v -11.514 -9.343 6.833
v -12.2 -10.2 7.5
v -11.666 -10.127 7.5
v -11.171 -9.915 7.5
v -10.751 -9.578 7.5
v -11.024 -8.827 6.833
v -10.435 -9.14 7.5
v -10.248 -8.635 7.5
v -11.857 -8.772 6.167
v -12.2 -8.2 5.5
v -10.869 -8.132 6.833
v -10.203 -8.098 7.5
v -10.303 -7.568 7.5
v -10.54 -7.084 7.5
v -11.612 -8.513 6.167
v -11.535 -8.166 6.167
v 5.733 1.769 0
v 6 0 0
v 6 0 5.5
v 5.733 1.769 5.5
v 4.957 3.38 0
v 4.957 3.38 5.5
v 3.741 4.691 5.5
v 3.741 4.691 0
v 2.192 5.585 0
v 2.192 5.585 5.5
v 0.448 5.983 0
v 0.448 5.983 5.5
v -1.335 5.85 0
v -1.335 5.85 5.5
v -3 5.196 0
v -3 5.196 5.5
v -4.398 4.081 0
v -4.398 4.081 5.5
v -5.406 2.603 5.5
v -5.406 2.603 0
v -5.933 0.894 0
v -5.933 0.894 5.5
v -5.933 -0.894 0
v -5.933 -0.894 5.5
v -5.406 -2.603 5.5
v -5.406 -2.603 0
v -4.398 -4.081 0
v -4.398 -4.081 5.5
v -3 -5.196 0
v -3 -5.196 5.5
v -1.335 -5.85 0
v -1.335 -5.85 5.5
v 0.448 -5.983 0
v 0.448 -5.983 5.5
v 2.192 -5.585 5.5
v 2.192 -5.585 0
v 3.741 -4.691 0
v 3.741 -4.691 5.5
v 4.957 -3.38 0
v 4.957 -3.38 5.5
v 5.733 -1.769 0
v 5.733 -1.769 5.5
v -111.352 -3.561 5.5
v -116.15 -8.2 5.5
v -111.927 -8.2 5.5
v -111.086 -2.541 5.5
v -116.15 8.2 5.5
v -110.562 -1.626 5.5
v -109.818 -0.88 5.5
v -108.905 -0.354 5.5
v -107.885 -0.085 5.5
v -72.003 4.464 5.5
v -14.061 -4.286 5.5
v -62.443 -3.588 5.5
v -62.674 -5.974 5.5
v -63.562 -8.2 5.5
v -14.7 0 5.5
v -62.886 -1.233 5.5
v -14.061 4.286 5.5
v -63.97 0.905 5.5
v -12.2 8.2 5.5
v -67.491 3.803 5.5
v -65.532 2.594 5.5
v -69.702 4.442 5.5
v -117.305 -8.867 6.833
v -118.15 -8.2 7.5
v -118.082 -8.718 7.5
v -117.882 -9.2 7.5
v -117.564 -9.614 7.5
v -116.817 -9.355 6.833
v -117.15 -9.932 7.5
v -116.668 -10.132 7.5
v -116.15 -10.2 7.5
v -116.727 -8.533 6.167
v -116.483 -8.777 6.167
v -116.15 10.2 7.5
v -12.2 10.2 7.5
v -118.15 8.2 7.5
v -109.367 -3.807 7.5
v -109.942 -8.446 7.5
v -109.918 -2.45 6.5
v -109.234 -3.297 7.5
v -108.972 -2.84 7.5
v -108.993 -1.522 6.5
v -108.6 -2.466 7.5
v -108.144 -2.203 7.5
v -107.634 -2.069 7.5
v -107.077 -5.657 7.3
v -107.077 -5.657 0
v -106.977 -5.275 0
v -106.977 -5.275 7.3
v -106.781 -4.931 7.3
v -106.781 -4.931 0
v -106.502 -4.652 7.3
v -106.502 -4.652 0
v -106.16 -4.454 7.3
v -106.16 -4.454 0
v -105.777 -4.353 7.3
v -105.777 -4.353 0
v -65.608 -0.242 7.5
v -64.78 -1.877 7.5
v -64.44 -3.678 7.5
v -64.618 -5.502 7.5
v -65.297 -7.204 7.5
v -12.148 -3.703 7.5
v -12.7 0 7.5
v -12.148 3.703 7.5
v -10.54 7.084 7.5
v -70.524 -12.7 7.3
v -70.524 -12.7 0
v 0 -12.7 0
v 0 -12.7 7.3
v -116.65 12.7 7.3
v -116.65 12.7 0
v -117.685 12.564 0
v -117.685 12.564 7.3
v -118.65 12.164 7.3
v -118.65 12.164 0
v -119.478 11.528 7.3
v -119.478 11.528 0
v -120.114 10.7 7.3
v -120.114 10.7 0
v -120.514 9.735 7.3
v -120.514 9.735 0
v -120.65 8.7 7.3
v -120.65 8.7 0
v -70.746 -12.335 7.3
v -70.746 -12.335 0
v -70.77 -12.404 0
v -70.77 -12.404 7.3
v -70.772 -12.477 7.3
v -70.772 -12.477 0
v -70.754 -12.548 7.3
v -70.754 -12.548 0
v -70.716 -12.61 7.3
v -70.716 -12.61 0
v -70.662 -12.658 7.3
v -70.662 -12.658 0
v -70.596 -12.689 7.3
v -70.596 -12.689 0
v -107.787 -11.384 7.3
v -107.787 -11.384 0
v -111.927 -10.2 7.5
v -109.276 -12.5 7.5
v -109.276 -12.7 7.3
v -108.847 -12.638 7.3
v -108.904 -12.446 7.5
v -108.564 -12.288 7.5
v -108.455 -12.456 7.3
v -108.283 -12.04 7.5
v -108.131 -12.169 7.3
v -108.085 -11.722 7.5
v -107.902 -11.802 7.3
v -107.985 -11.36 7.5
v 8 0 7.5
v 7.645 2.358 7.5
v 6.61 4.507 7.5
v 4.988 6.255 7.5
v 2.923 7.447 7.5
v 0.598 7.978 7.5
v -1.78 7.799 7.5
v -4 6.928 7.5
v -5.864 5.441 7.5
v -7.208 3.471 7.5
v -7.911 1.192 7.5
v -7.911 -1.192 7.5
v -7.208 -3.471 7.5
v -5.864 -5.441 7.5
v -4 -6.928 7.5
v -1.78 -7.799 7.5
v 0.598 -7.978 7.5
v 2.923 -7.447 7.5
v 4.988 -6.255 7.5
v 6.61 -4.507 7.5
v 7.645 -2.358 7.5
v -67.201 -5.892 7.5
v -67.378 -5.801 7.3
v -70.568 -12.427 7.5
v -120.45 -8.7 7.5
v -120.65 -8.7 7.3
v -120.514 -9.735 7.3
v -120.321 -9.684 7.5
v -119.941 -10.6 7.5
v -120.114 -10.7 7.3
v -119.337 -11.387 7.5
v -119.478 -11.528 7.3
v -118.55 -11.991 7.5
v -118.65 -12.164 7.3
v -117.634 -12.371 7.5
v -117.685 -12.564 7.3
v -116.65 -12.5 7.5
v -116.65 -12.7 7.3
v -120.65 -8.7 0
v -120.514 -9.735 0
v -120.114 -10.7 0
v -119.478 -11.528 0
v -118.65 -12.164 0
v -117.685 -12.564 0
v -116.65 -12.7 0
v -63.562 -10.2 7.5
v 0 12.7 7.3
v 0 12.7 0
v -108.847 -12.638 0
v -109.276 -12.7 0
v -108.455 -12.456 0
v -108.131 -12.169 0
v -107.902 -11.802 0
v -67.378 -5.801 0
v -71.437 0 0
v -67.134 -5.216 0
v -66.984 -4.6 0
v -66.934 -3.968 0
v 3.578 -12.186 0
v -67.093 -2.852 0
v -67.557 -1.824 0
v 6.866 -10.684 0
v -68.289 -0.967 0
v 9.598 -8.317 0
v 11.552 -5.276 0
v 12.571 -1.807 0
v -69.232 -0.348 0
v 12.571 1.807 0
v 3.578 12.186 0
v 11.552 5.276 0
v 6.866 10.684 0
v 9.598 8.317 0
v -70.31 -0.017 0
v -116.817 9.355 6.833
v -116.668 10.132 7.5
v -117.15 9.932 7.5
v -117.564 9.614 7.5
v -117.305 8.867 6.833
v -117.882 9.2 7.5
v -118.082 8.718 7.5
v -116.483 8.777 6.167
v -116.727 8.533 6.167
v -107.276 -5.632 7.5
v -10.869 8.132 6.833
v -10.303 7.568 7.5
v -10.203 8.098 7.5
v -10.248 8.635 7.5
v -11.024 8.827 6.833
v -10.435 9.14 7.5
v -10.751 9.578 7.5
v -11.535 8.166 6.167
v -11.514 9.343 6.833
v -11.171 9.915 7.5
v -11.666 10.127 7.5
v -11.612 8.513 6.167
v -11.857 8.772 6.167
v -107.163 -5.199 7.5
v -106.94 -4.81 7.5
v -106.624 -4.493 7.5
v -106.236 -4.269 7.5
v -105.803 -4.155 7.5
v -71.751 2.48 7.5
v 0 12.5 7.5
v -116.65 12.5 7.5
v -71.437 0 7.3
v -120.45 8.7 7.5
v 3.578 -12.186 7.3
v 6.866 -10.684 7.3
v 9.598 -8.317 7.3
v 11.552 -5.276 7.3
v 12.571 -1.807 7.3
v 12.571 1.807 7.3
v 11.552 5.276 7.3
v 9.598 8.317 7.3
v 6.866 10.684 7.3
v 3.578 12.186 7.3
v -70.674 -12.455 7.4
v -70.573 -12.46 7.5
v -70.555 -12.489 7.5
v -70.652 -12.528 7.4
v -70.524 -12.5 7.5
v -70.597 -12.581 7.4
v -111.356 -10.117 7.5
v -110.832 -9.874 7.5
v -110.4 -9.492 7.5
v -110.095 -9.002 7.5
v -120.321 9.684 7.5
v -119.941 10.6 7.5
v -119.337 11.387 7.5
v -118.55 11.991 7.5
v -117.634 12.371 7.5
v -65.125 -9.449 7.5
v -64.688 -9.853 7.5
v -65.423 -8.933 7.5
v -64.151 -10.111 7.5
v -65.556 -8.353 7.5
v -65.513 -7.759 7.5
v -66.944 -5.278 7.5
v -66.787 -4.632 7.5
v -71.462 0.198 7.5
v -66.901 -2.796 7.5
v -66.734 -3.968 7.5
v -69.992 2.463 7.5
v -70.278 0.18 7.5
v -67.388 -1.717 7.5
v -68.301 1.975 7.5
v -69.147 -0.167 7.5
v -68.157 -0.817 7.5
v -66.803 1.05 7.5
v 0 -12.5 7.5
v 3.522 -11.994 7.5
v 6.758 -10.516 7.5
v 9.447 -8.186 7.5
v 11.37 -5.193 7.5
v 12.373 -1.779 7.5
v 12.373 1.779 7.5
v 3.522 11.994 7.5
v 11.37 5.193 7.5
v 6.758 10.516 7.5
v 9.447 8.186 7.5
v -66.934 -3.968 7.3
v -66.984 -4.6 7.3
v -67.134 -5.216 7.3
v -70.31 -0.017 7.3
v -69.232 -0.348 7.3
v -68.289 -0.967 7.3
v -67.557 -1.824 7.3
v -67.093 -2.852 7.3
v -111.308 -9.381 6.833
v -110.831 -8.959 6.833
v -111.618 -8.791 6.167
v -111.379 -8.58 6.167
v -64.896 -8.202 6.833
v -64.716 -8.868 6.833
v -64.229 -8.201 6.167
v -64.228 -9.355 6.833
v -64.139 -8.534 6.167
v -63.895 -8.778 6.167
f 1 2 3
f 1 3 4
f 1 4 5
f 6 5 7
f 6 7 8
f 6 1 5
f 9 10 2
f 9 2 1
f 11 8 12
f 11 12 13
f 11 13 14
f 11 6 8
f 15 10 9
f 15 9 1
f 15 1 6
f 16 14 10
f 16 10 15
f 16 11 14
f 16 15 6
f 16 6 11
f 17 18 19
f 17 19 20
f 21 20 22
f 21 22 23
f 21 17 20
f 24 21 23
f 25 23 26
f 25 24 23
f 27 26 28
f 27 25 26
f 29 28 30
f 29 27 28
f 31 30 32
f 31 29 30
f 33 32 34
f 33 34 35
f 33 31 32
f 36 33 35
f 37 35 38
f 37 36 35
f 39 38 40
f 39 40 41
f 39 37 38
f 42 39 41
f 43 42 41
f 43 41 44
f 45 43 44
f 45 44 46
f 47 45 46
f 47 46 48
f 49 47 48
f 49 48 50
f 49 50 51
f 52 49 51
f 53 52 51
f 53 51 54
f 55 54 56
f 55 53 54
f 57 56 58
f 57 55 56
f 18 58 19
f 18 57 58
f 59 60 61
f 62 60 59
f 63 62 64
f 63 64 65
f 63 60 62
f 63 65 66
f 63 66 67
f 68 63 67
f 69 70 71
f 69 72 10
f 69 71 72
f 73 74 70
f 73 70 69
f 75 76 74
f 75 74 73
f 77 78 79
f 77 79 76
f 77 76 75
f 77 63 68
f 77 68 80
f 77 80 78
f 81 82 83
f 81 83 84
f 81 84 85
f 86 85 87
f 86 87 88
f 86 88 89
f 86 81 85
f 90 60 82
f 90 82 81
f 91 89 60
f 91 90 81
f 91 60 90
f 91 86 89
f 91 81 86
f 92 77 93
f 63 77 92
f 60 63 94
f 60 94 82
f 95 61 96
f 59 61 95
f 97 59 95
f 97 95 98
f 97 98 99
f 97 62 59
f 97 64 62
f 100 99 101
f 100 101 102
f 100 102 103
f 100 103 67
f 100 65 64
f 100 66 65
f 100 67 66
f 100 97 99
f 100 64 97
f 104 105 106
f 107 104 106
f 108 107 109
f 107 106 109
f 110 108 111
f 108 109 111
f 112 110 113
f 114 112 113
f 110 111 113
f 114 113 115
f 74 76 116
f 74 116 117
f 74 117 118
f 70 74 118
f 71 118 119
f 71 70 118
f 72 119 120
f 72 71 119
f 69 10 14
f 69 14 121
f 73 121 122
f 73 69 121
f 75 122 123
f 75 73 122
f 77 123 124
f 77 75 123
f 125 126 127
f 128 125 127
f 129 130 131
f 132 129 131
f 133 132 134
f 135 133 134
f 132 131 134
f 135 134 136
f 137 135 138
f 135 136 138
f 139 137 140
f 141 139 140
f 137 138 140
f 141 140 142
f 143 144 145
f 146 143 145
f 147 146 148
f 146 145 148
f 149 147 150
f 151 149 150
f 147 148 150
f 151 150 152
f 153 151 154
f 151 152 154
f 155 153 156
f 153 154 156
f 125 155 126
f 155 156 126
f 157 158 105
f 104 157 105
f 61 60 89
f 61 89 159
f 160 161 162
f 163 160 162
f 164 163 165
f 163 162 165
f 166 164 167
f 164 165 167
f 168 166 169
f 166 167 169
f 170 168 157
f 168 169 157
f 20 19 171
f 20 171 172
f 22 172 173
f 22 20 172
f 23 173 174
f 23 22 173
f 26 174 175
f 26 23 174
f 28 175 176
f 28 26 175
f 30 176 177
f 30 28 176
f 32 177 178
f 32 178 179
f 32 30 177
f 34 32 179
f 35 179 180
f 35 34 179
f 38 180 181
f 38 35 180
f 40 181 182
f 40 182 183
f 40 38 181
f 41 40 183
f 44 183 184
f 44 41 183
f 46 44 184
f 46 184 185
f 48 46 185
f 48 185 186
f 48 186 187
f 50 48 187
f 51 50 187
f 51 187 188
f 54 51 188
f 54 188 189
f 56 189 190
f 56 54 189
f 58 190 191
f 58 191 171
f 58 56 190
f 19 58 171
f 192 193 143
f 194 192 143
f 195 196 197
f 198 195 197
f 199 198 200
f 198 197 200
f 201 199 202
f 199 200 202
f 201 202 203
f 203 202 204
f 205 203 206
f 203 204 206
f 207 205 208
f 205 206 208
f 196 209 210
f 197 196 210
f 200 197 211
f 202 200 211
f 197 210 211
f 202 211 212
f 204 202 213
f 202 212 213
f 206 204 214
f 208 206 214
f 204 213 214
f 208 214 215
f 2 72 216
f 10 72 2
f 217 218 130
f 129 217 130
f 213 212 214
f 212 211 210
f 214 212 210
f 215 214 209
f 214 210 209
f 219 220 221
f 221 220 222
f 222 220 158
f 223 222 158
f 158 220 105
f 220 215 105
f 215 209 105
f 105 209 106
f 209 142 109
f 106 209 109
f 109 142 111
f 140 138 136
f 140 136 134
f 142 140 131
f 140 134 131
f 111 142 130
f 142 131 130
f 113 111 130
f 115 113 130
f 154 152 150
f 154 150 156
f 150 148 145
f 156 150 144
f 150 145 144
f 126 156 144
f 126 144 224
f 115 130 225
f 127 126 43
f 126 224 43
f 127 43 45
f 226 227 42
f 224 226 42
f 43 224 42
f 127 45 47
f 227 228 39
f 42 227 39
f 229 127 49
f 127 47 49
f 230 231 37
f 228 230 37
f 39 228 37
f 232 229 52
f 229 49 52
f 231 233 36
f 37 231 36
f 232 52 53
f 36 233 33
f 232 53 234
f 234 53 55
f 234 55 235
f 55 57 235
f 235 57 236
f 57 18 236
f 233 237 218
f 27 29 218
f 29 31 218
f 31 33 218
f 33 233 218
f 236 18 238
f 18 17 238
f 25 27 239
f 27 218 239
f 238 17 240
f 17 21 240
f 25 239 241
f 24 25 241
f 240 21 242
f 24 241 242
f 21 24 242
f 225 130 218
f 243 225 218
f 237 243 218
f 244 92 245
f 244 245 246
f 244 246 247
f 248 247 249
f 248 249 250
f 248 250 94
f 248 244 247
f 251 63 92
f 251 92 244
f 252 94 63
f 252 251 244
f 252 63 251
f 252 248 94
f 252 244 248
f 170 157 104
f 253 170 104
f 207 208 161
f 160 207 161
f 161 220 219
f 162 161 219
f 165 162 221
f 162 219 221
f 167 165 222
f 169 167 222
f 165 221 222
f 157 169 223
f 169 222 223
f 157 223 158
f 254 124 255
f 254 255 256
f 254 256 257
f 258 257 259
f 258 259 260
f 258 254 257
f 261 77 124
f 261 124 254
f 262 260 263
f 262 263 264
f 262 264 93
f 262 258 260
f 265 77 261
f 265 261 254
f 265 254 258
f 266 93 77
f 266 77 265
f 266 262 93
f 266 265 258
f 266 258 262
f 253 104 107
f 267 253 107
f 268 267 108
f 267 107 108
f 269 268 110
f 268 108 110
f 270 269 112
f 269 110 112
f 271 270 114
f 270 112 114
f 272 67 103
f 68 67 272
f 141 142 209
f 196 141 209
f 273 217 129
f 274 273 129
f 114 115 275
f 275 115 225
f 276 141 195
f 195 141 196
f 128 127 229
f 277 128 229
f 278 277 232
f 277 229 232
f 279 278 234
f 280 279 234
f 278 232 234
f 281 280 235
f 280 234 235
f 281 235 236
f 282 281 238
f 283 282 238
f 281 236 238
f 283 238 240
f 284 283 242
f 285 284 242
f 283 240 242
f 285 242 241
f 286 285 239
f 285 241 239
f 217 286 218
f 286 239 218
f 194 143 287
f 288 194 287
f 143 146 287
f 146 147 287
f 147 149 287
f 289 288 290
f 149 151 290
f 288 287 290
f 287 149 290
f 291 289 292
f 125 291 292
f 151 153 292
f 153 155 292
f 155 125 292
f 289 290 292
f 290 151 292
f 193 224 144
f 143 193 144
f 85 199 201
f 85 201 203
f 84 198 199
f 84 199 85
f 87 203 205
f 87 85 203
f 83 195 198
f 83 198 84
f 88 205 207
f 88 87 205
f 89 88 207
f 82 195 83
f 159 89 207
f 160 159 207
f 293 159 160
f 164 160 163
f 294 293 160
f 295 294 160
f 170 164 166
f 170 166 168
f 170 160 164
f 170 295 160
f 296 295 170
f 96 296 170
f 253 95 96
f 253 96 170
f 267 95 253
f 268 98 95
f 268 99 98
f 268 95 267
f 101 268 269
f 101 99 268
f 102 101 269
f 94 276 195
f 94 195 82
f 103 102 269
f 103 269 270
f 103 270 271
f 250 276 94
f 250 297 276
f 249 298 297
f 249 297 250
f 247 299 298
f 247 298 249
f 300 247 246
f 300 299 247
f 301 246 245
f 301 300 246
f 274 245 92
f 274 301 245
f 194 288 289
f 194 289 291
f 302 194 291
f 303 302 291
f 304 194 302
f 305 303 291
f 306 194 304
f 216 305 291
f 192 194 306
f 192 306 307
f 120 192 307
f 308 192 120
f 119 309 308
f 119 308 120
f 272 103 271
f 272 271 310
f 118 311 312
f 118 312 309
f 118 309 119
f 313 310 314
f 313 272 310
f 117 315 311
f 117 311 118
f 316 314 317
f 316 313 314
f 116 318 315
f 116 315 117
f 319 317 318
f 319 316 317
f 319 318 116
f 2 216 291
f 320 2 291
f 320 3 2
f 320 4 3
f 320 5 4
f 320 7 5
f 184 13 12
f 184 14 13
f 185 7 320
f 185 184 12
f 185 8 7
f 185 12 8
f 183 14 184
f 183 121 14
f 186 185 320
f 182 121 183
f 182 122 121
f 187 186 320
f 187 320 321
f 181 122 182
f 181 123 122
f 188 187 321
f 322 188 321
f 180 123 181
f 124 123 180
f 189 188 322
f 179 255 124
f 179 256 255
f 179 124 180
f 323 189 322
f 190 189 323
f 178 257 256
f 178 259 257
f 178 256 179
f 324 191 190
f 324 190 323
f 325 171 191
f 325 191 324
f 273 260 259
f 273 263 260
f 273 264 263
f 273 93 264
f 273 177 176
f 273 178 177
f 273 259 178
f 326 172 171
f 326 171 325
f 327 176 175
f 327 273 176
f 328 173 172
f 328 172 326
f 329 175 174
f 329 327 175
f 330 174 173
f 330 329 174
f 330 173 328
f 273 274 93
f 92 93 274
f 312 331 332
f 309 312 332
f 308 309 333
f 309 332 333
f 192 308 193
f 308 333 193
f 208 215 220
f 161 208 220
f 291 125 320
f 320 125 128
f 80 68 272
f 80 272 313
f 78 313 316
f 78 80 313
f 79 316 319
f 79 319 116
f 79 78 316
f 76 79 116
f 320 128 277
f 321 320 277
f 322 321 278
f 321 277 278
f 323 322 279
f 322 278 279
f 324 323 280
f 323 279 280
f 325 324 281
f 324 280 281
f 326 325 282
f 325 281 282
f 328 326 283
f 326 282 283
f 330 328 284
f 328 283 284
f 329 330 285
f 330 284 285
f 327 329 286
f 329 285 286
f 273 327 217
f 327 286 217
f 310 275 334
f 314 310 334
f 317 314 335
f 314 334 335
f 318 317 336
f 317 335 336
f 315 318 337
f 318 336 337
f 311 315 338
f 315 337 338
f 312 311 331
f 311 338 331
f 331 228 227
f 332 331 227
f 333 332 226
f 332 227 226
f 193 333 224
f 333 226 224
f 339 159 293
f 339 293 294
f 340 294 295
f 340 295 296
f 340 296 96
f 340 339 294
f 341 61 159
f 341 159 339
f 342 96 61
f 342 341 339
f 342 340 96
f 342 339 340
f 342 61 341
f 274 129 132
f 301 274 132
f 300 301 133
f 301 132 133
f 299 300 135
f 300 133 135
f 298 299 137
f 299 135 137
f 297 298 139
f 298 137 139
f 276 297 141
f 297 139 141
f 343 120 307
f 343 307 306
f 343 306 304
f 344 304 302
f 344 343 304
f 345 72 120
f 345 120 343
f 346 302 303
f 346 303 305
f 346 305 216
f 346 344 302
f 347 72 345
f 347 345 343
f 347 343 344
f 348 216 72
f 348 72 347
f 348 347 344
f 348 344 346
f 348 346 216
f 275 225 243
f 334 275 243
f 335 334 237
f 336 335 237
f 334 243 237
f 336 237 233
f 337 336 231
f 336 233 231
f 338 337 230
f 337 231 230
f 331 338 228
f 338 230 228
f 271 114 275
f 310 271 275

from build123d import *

# Parameters (mm, degrees)
F0_R     = 6
F1_DEPTH = 7.5
F3_DEPTH = 2
F4_SIZE  = 1.99999
F5_SIZE  = 2
F6_SIZE  = 0.2


# Not quite as in the source:
# - a fillet or chamfer is up to 0.001 mm smaller than in the source, because OpenCascade refuses the exact size


with BuildPart() as f1:
    # F0 (on Top) → F1 (new body)
    with BuildSketch(Plane.XY):
        with BuildLine():
            Line((0, 12.7), (-116.65, 12.7))
            ThreePointArc((-116.65, 12.7), (-119.4784271247, 11.5284271247), (-120.65, 8.7))
            Line((-120.65, 8.7), (-120.65, -8.7))
            ThreePointArc((-120.65, -8.7), (-119.4784271247, -11.5284271247), (-116.65, -12.7))
            Line((-116.65, -12.7), (-109.2756163486, -12.7))
            ThreePointArc((-109.2756163486, -12.7), (-108.2823049478, -12.323980632), (-107.7869993139, -11.3844432814))
            Line((-107.7869993139, -11.3844432814), (-107.0773577752, -5.6570214144))
            ThreePointArc((-107.0773577752, -5.6570214144), (-106.6508978642, -4.7823035915), (-105.77738814, -4.3533745914))
            Line((-105.77738814, -4.3533745914), (-71.4370597318, 0))
            ThreePointArc((-71.4370597318, 0), (-68.2894054117, -0.967220541), (-66.934, -3.9682402783))
            ThreePointArc((-66.934, -3.9682402783), (-67.0466854589, -4.910994572), (-67.3783928291, -5.8006315156))
            Line((-67.3783928291, -5.8006315156), (-70.7461413924, -12.3354755477))
            ThreePointArc((-70.7461413924, -12.3354755477), (-70.7373768459, -12.5801324074), (-70.5239159442, -12.7))
            Line((-70.5239159442, -12.7), (0, -12.7))
            ThreePointArc((0, -12.7), (12.7, 0), (0, 12.7))
        make_face()
        Circle(F0_R, mode=Mode.SUBTRACT)
    extrude(amount=F1_DEPTH)

    # F2 (on face) → F3 (cut)
    with BuildSketch(Plane.XY.offset(7.5)):
        with BuildLine():
            ThreePointArc((-10.5404901245, -7.0843537415), (-12.7, 0), (-10.5404901245, 7.0843537415))
            ThreePointArc((-10.5404901245, 7.0843537415), (-10.4352904965, 9.1404008409), (-12.2004098292, 10.2))
            Line((-12.2004098292, 10.2), (-116.15, 10.2))
            ThreePointArc((-116.15, 10.2), (-117.5642135624, 9.6142135624), (-118.15, 8.2))
            Line((-118.15, 8.2), (-118.15, -8.2))
            ThreePointArc((-118.15, -8.2), (-117.5642135624, -9.6142135624), (-116.15, -10.2))
            Line((-116.15, -10.2), (-111.9268490457, -10.2))
            ThreePointArc((-111.9268490457, -10.2), (-110.6024338446, -9.6986408426), (-109.9420263328, -8.4459243752))
            Line((-109.9420263328, -8.4459243752), (-109.3672424661, -3.8069207262))
            ThreePointArc((-109.3672424661, -3.8069207262), (-108.7986292513, -2.6406302958), (-107.6339496191, -2.0687249623))
            Line((-107.6339496191, -2.0687249623), (-71.7514720642, 2.4801501739))
            ThreePointArc((-71.7514720642, 2.4801501739), (-68.3008484478, 1.9745295223), (-65.6082269333, -0.2418289696))
            ThreePointArc((-65.6082269333, -0.2418289696), (-64.4404924053, -3.6777938671), (-65.2968047441, -7.2042918302))
            ThreePointArc((-65.2968047441, -7.2042918302), (-65.2930945463, -9.2021436175), (-63.5622831269, -10.2))
            Line((-63.5622831269, -10.2), (-12.2004098292, -10.2))
            ThreePointArc((-12.2004098292, -10.2), (-10.4352904965, -9.1404008409), (-10.5404901245, -7.0843537415))
        make_face()
    extrude(amount=-F3_DEPTH, mode=Mode.SUBTRACT)

    # F4 (size 2 in the source; OpenCascade refuses exactly that, so slightly less here)
    f4_edges = [f1.edges().sort_by_distance(p)[0] for p in [
        (-12.7, 0, 5.5),
        (-10.43529, 9.140401, 5.5),
        (-64.175205, 10.2, 5.5),
        (-117.564214, 9.614214, 5.5),
        (-118.15, 0, 5.5),
        (-117.564214, -9.614214, 5.5),
        (-114.038425, -10.2, 5.5),
        (-110.602434, -9.698641, 5.5),
        (-109.654634, -6.126423, 5.5),
        (-108.798629, -2.64063, 5.5),
        (-89.692711, 0.205713, 5.5),
        (-65.525254, -0.363318, 5.5),
        (-65.293095, -9.202144, 5.5),
        (-37.881346, -10.2, 5.5),
        (-10.43529, -9.140401, 5.5),
    ]]
    chamfer(f4_edges, length=F4_SIZE)

    # F5
    f5_edges = [f1.edges().sort_by_distance(p)[0] for p in [
        (-6, 0, 7.5),
    ]]
    chamfer(f5_edges, length=F5_SIZE)

    # F6
    f6_edges = [f1.edges().sort_by_distance(p)[0] for p in [
        (-58.325, 12.7, 7.5),
    ]]
    chamfer(f6_edges, length=F6_SIZE)


solid = f1.part
